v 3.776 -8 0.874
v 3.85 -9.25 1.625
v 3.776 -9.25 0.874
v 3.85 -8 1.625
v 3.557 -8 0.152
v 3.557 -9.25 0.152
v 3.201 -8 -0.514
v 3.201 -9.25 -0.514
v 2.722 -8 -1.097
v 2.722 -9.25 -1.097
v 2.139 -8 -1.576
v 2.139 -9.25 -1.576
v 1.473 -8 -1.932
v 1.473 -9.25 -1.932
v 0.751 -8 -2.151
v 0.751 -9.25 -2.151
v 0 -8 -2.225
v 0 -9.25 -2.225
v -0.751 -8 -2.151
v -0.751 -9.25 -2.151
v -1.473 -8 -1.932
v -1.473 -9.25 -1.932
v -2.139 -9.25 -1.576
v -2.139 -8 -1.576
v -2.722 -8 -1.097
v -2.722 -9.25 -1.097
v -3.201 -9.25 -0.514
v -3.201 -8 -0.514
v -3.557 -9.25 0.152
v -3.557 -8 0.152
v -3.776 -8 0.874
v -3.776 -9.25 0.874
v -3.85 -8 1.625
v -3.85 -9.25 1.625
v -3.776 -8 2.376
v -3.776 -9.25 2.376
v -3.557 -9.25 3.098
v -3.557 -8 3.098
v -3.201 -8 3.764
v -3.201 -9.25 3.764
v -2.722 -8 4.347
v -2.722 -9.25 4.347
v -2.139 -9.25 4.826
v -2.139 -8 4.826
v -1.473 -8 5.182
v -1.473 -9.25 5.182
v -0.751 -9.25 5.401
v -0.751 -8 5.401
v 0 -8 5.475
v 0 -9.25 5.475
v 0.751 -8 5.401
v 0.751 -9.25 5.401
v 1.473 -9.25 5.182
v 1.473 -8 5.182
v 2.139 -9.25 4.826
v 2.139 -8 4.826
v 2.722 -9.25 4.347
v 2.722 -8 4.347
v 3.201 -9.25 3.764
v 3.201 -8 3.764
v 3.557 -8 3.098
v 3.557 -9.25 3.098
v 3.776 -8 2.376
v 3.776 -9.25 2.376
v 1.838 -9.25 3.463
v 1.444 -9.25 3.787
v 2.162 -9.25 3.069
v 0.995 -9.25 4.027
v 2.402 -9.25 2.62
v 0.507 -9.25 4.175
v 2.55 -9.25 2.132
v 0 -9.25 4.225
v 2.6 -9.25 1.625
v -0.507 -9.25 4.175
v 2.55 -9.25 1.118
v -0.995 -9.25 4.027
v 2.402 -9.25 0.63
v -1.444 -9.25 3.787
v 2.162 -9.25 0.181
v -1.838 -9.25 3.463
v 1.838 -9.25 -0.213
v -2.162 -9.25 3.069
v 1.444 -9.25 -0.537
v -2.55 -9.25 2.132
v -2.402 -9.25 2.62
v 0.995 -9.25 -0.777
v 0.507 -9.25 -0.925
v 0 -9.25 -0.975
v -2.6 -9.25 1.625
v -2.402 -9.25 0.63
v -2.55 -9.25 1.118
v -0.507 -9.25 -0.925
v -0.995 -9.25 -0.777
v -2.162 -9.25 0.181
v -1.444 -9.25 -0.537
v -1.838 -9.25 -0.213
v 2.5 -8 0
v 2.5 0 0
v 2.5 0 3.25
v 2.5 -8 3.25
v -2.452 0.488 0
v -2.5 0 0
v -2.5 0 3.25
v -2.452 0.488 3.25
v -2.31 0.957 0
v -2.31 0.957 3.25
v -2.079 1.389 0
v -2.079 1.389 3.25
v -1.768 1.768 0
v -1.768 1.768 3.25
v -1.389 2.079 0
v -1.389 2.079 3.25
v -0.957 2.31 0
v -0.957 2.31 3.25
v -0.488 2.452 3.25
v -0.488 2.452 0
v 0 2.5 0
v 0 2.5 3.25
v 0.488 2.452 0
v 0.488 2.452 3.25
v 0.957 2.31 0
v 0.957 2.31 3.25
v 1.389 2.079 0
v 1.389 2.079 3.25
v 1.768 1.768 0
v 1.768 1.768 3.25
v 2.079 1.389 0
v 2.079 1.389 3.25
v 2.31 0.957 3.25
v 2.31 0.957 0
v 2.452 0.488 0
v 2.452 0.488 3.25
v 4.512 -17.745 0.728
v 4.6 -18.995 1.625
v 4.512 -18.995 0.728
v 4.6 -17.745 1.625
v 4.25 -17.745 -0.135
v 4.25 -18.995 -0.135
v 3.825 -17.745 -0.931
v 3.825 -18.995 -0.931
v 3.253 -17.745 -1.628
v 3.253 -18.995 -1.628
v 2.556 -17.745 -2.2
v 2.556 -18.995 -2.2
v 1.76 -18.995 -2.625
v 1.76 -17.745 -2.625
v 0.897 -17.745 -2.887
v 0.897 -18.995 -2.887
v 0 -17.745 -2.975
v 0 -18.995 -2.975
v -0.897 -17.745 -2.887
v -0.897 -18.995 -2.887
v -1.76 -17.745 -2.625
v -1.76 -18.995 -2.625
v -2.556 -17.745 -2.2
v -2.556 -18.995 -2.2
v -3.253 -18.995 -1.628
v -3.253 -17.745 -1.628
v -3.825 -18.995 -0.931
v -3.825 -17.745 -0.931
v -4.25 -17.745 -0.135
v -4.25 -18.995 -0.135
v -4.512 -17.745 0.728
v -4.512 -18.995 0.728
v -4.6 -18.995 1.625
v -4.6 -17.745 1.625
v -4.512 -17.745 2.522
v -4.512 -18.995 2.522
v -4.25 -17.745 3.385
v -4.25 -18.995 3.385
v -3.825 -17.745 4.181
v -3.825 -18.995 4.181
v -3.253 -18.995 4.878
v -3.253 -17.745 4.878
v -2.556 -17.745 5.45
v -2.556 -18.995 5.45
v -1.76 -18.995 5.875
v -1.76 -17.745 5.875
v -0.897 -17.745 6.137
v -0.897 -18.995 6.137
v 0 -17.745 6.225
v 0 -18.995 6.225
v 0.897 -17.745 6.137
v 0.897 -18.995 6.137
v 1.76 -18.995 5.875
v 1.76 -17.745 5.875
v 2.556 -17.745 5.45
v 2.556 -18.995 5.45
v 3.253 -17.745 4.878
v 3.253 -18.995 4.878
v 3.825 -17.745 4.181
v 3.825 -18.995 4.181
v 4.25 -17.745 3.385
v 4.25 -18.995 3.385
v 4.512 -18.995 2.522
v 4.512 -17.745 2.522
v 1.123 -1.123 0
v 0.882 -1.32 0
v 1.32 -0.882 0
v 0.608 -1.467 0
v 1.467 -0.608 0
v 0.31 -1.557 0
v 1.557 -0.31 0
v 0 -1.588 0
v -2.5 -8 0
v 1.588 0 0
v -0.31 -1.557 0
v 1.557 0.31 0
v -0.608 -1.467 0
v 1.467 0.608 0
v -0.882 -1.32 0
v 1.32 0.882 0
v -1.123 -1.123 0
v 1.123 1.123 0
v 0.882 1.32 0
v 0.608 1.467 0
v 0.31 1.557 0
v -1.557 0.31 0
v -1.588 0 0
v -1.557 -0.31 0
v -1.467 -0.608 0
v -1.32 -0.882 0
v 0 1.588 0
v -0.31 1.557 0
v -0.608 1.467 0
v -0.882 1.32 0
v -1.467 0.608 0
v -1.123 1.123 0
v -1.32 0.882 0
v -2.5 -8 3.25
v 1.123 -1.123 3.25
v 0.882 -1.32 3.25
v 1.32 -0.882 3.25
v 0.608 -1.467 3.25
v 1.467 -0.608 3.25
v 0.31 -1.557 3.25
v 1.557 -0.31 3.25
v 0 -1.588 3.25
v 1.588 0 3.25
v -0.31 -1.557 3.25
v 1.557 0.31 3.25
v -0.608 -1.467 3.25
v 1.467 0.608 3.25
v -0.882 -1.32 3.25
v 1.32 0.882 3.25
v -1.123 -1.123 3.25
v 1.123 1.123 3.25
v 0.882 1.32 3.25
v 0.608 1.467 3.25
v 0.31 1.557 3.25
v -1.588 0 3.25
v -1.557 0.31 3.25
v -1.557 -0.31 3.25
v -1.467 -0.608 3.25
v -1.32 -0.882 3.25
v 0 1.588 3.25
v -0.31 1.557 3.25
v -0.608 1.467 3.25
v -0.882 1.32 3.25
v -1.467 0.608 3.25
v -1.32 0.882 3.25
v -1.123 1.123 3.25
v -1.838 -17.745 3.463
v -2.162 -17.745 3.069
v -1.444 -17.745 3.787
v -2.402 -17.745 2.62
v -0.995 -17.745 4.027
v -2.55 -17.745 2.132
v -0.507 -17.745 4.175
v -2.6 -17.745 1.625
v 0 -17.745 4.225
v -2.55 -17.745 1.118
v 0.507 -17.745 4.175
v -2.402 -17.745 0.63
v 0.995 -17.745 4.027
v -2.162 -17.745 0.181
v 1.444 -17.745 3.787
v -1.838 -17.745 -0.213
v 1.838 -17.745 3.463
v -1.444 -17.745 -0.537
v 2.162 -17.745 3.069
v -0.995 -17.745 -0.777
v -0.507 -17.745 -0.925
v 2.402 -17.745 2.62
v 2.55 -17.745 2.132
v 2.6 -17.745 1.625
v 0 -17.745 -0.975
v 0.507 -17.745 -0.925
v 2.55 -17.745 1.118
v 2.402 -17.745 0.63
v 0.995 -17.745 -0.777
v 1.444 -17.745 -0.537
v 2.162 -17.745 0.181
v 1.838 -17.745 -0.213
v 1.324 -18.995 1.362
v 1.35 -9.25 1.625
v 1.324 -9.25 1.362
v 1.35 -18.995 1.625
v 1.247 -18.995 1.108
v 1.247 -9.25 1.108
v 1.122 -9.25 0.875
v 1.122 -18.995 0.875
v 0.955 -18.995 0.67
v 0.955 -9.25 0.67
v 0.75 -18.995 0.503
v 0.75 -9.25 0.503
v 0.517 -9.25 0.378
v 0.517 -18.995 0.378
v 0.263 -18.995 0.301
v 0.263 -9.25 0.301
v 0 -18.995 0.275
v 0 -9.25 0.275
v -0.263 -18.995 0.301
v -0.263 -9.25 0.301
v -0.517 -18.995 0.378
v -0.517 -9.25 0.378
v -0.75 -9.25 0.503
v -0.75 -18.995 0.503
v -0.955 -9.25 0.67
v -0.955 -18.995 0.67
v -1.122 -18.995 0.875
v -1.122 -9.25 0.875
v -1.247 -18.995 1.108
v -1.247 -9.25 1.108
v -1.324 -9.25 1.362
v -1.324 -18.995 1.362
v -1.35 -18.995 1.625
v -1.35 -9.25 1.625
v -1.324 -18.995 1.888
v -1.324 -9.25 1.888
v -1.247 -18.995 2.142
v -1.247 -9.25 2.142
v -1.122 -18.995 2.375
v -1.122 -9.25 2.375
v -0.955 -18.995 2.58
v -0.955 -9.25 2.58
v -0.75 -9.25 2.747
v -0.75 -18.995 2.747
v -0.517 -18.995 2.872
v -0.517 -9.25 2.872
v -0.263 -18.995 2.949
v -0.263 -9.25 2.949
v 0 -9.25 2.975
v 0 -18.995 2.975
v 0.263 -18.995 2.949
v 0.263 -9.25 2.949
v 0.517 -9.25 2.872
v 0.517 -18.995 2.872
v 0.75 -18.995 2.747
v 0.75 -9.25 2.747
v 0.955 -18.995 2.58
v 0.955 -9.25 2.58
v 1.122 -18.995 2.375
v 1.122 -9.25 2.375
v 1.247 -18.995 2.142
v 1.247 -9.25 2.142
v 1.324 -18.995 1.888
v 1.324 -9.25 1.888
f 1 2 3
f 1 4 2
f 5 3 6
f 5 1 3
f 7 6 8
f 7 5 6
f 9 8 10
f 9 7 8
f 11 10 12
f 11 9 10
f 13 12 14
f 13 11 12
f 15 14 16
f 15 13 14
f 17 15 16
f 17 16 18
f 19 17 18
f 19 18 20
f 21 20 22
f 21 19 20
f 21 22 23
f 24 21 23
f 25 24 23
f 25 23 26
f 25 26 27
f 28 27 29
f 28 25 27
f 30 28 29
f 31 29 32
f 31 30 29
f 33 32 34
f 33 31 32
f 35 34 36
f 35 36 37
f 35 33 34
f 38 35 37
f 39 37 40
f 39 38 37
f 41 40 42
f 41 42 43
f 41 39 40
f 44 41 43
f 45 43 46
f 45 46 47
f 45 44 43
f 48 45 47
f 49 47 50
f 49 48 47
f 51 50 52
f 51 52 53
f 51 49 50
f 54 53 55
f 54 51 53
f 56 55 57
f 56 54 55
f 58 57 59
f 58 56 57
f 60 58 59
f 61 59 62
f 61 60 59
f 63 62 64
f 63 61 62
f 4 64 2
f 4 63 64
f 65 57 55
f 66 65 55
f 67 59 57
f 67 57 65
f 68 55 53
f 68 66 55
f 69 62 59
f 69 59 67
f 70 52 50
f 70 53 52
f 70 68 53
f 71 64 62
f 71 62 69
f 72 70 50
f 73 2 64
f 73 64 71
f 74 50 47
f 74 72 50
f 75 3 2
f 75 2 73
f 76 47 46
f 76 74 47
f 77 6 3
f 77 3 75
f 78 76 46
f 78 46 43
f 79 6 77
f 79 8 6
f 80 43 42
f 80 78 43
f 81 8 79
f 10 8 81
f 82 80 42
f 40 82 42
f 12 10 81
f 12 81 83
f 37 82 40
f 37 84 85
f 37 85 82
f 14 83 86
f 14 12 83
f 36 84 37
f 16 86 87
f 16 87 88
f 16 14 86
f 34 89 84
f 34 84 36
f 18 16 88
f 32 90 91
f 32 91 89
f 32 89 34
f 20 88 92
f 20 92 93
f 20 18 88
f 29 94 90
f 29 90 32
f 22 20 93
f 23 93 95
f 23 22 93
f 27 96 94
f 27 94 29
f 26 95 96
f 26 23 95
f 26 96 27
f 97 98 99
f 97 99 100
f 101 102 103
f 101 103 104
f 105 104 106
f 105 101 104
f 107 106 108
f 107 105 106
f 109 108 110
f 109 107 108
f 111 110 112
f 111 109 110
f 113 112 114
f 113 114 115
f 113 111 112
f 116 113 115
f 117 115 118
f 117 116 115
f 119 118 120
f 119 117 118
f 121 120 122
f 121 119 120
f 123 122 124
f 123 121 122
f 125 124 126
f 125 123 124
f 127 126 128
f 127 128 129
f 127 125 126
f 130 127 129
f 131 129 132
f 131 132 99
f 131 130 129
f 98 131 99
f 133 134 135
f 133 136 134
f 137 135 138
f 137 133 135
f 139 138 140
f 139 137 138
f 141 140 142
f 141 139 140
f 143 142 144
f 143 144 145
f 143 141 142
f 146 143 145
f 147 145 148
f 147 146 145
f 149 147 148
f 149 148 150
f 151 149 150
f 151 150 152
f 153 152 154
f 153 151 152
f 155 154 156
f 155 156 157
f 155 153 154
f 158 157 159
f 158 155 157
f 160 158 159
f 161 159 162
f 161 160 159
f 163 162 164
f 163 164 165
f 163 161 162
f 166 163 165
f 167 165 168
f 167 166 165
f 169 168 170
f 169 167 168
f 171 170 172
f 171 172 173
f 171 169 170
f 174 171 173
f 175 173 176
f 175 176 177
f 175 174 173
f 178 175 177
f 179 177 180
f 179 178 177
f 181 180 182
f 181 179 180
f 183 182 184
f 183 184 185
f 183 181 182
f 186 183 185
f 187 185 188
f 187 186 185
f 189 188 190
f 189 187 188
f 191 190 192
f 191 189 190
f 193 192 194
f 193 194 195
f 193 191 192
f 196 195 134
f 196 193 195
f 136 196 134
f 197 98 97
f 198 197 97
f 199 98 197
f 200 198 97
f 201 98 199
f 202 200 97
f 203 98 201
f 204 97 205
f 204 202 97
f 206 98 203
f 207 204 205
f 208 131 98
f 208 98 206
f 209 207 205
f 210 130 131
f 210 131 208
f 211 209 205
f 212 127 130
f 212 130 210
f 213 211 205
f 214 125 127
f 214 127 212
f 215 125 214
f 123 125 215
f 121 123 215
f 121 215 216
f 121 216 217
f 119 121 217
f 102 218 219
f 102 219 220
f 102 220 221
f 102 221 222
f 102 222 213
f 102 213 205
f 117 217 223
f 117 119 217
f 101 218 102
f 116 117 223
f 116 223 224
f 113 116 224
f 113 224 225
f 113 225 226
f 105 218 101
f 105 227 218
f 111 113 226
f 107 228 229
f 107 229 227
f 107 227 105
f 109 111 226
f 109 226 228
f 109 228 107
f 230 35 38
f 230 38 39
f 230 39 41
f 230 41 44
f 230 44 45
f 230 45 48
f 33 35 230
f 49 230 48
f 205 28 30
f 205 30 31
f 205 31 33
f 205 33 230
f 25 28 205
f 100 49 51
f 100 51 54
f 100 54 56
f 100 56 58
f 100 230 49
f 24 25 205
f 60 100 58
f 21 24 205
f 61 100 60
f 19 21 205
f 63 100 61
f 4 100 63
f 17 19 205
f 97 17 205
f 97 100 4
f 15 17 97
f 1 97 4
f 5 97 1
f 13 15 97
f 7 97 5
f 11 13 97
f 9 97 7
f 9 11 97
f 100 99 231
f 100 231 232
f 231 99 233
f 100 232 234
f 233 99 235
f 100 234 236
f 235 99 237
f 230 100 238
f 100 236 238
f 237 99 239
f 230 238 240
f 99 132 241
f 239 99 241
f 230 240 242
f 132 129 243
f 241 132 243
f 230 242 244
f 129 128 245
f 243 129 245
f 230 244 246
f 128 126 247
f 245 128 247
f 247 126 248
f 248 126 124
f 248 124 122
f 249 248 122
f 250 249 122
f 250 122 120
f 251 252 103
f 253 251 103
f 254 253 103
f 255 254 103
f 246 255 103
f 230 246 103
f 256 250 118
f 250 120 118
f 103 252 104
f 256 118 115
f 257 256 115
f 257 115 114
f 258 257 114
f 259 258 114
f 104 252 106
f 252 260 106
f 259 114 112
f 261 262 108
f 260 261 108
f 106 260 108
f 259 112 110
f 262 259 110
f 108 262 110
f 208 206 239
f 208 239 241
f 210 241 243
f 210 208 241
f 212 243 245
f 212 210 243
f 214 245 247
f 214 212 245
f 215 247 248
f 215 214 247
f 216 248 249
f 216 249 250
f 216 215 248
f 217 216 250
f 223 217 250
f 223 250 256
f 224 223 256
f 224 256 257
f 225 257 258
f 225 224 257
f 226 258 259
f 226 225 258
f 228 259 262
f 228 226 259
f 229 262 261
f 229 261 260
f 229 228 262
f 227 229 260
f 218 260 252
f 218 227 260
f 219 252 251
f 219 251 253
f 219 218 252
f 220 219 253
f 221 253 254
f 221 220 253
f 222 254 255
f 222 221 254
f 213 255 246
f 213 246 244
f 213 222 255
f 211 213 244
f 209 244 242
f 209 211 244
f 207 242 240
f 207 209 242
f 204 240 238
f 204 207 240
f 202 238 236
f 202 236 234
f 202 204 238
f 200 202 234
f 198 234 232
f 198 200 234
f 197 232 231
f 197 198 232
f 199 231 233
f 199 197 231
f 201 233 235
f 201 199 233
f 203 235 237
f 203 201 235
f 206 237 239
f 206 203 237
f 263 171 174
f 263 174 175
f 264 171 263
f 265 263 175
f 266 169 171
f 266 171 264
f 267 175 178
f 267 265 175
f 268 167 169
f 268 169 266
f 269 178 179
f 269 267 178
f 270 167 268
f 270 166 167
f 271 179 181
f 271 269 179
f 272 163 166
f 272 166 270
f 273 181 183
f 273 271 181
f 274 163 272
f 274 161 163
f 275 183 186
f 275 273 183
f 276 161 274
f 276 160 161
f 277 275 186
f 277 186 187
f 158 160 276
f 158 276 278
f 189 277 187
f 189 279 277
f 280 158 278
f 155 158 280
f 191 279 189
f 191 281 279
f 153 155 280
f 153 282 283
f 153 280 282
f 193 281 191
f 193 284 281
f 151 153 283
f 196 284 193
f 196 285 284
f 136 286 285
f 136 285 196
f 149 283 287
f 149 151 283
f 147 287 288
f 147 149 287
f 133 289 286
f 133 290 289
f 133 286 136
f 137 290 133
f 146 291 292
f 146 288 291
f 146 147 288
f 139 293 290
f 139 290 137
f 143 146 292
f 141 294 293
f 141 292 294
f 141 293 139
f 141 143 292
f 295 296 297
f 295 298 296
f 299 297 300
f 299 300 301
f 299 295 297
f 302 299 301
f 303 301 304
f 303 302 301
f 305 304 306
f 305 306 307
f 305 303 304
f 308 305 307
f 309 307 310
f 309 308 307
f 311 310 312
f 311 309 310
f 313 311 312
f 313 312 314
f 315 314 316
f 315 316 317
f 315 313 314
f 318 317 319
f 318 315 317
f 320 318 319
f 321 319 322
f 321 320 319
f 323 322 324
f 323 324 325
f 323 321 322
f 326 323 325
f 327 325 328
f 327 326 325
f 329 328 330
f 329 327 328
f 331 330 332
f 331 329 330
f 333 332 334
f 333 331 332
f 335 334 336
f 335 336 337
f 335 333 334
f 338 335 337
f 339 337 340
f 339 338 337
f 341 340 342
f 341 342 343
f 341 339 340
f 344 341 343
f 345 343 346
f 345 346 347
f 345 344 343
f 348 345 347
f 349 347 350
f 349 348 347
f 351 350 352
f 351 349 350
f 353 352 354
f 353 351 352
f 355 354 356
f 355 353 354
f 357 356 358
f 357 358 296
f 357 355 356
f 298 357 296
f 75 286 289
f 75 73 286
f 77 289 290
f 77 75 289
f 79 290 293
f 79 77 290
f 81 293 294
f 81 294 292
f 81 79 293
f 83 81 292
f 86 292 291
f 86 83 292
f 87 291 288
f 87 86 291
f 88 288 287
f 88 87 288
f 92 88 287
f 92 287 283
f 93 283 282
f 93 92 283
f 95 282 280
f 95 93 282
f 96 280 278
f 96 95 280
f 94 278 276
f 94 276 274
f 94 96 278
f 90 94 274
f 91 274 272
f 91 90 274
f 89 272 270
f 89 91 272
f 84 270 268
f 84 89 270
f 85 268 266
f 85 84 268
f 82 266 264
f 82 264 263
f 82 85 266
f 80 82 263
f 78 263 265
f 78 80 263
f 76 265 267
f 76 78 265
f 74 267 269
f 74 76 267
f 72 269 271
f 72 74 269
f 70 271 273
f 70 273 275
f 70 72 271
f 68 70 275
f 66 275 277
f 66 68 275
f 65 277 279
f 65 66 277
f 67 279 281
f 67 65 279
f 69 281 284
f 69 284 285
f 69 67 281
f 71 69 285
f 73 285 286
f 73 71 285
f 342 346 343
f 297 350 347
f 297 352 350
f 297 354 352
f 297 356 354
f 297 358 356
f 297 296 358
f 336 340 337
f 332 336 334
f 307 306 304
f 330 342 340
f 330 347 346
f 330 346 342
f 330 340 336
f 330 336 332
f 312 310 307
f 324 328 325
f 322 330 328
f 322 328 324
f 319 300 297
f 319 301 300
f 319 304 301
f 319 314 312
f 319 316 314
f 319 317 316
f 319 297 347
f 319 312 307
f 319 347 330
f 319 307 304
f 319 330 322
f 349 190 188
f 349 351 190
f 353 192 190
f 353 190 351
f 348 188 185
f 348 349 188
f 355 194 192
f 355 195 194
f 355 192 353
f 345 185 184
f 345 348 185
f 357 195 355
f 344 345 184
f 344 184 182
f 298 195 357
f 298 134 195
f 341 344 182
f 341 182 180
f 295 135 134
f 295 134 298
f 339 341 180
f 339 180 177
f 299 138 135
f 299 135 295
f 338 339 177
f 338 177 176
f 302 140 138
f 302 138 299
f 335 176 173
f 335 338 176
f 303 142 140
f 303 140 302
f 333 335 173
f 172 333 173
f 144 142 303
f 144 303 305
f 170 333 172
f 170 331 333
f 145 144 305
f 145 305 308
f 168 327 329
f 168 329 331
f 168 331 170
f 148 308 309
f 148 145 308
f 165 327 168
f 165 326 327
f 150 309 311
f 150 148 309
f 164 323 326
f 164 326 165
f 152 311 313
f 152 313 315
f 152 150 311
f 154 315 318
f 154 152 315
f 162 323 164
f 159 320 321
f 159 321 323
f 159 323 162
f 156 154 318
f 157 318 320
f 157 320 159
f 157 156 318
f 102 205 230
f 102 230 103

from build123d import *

# Parameters (mm, degrees)
SKETCH1_R           = 1.5875
BOSS_EXTRUDE1_DEPTH = 3.25


with BuildPart() as part:
    # Sketch1 → Boss-Extrude1 (new body)
    with BuildSketch(Plane.XY):
        with BuildLine():
            Line((2.5, 0), (2.5, -8))
            Line((2.5, -8), (-2.5, -8))
            Line((-2.5, -8), (-2.5, 0))
            ThreePointArc((-2.5, 0), (0, 2.5), (2.5, 0))
        make_face()
        Circle(SKETCH1_R, mode=Mode.SUBTRACT)
    extrude(amount=BOSS_EXTRUDE1_DEPTH)

    # Sketch4 one side → Revolve1 (revolve)
    with BuildSketch(Plane.XY.offset(1.625)):
        Polygon((2.6, -8), (0, -8), (0, -9.25), (1.35, -9.25), (1.35, -18.994831853), (4.6, -18.994831853), (4.6, -17.744831853), (2.6, -17.744831853), (2.6, -9.25), (3.85, -9.25), (3.85, -8), align=None)
    revolve(axis=Axis((0, -19.5, 1.625), (0, 1, 0)))


solid = part.part
